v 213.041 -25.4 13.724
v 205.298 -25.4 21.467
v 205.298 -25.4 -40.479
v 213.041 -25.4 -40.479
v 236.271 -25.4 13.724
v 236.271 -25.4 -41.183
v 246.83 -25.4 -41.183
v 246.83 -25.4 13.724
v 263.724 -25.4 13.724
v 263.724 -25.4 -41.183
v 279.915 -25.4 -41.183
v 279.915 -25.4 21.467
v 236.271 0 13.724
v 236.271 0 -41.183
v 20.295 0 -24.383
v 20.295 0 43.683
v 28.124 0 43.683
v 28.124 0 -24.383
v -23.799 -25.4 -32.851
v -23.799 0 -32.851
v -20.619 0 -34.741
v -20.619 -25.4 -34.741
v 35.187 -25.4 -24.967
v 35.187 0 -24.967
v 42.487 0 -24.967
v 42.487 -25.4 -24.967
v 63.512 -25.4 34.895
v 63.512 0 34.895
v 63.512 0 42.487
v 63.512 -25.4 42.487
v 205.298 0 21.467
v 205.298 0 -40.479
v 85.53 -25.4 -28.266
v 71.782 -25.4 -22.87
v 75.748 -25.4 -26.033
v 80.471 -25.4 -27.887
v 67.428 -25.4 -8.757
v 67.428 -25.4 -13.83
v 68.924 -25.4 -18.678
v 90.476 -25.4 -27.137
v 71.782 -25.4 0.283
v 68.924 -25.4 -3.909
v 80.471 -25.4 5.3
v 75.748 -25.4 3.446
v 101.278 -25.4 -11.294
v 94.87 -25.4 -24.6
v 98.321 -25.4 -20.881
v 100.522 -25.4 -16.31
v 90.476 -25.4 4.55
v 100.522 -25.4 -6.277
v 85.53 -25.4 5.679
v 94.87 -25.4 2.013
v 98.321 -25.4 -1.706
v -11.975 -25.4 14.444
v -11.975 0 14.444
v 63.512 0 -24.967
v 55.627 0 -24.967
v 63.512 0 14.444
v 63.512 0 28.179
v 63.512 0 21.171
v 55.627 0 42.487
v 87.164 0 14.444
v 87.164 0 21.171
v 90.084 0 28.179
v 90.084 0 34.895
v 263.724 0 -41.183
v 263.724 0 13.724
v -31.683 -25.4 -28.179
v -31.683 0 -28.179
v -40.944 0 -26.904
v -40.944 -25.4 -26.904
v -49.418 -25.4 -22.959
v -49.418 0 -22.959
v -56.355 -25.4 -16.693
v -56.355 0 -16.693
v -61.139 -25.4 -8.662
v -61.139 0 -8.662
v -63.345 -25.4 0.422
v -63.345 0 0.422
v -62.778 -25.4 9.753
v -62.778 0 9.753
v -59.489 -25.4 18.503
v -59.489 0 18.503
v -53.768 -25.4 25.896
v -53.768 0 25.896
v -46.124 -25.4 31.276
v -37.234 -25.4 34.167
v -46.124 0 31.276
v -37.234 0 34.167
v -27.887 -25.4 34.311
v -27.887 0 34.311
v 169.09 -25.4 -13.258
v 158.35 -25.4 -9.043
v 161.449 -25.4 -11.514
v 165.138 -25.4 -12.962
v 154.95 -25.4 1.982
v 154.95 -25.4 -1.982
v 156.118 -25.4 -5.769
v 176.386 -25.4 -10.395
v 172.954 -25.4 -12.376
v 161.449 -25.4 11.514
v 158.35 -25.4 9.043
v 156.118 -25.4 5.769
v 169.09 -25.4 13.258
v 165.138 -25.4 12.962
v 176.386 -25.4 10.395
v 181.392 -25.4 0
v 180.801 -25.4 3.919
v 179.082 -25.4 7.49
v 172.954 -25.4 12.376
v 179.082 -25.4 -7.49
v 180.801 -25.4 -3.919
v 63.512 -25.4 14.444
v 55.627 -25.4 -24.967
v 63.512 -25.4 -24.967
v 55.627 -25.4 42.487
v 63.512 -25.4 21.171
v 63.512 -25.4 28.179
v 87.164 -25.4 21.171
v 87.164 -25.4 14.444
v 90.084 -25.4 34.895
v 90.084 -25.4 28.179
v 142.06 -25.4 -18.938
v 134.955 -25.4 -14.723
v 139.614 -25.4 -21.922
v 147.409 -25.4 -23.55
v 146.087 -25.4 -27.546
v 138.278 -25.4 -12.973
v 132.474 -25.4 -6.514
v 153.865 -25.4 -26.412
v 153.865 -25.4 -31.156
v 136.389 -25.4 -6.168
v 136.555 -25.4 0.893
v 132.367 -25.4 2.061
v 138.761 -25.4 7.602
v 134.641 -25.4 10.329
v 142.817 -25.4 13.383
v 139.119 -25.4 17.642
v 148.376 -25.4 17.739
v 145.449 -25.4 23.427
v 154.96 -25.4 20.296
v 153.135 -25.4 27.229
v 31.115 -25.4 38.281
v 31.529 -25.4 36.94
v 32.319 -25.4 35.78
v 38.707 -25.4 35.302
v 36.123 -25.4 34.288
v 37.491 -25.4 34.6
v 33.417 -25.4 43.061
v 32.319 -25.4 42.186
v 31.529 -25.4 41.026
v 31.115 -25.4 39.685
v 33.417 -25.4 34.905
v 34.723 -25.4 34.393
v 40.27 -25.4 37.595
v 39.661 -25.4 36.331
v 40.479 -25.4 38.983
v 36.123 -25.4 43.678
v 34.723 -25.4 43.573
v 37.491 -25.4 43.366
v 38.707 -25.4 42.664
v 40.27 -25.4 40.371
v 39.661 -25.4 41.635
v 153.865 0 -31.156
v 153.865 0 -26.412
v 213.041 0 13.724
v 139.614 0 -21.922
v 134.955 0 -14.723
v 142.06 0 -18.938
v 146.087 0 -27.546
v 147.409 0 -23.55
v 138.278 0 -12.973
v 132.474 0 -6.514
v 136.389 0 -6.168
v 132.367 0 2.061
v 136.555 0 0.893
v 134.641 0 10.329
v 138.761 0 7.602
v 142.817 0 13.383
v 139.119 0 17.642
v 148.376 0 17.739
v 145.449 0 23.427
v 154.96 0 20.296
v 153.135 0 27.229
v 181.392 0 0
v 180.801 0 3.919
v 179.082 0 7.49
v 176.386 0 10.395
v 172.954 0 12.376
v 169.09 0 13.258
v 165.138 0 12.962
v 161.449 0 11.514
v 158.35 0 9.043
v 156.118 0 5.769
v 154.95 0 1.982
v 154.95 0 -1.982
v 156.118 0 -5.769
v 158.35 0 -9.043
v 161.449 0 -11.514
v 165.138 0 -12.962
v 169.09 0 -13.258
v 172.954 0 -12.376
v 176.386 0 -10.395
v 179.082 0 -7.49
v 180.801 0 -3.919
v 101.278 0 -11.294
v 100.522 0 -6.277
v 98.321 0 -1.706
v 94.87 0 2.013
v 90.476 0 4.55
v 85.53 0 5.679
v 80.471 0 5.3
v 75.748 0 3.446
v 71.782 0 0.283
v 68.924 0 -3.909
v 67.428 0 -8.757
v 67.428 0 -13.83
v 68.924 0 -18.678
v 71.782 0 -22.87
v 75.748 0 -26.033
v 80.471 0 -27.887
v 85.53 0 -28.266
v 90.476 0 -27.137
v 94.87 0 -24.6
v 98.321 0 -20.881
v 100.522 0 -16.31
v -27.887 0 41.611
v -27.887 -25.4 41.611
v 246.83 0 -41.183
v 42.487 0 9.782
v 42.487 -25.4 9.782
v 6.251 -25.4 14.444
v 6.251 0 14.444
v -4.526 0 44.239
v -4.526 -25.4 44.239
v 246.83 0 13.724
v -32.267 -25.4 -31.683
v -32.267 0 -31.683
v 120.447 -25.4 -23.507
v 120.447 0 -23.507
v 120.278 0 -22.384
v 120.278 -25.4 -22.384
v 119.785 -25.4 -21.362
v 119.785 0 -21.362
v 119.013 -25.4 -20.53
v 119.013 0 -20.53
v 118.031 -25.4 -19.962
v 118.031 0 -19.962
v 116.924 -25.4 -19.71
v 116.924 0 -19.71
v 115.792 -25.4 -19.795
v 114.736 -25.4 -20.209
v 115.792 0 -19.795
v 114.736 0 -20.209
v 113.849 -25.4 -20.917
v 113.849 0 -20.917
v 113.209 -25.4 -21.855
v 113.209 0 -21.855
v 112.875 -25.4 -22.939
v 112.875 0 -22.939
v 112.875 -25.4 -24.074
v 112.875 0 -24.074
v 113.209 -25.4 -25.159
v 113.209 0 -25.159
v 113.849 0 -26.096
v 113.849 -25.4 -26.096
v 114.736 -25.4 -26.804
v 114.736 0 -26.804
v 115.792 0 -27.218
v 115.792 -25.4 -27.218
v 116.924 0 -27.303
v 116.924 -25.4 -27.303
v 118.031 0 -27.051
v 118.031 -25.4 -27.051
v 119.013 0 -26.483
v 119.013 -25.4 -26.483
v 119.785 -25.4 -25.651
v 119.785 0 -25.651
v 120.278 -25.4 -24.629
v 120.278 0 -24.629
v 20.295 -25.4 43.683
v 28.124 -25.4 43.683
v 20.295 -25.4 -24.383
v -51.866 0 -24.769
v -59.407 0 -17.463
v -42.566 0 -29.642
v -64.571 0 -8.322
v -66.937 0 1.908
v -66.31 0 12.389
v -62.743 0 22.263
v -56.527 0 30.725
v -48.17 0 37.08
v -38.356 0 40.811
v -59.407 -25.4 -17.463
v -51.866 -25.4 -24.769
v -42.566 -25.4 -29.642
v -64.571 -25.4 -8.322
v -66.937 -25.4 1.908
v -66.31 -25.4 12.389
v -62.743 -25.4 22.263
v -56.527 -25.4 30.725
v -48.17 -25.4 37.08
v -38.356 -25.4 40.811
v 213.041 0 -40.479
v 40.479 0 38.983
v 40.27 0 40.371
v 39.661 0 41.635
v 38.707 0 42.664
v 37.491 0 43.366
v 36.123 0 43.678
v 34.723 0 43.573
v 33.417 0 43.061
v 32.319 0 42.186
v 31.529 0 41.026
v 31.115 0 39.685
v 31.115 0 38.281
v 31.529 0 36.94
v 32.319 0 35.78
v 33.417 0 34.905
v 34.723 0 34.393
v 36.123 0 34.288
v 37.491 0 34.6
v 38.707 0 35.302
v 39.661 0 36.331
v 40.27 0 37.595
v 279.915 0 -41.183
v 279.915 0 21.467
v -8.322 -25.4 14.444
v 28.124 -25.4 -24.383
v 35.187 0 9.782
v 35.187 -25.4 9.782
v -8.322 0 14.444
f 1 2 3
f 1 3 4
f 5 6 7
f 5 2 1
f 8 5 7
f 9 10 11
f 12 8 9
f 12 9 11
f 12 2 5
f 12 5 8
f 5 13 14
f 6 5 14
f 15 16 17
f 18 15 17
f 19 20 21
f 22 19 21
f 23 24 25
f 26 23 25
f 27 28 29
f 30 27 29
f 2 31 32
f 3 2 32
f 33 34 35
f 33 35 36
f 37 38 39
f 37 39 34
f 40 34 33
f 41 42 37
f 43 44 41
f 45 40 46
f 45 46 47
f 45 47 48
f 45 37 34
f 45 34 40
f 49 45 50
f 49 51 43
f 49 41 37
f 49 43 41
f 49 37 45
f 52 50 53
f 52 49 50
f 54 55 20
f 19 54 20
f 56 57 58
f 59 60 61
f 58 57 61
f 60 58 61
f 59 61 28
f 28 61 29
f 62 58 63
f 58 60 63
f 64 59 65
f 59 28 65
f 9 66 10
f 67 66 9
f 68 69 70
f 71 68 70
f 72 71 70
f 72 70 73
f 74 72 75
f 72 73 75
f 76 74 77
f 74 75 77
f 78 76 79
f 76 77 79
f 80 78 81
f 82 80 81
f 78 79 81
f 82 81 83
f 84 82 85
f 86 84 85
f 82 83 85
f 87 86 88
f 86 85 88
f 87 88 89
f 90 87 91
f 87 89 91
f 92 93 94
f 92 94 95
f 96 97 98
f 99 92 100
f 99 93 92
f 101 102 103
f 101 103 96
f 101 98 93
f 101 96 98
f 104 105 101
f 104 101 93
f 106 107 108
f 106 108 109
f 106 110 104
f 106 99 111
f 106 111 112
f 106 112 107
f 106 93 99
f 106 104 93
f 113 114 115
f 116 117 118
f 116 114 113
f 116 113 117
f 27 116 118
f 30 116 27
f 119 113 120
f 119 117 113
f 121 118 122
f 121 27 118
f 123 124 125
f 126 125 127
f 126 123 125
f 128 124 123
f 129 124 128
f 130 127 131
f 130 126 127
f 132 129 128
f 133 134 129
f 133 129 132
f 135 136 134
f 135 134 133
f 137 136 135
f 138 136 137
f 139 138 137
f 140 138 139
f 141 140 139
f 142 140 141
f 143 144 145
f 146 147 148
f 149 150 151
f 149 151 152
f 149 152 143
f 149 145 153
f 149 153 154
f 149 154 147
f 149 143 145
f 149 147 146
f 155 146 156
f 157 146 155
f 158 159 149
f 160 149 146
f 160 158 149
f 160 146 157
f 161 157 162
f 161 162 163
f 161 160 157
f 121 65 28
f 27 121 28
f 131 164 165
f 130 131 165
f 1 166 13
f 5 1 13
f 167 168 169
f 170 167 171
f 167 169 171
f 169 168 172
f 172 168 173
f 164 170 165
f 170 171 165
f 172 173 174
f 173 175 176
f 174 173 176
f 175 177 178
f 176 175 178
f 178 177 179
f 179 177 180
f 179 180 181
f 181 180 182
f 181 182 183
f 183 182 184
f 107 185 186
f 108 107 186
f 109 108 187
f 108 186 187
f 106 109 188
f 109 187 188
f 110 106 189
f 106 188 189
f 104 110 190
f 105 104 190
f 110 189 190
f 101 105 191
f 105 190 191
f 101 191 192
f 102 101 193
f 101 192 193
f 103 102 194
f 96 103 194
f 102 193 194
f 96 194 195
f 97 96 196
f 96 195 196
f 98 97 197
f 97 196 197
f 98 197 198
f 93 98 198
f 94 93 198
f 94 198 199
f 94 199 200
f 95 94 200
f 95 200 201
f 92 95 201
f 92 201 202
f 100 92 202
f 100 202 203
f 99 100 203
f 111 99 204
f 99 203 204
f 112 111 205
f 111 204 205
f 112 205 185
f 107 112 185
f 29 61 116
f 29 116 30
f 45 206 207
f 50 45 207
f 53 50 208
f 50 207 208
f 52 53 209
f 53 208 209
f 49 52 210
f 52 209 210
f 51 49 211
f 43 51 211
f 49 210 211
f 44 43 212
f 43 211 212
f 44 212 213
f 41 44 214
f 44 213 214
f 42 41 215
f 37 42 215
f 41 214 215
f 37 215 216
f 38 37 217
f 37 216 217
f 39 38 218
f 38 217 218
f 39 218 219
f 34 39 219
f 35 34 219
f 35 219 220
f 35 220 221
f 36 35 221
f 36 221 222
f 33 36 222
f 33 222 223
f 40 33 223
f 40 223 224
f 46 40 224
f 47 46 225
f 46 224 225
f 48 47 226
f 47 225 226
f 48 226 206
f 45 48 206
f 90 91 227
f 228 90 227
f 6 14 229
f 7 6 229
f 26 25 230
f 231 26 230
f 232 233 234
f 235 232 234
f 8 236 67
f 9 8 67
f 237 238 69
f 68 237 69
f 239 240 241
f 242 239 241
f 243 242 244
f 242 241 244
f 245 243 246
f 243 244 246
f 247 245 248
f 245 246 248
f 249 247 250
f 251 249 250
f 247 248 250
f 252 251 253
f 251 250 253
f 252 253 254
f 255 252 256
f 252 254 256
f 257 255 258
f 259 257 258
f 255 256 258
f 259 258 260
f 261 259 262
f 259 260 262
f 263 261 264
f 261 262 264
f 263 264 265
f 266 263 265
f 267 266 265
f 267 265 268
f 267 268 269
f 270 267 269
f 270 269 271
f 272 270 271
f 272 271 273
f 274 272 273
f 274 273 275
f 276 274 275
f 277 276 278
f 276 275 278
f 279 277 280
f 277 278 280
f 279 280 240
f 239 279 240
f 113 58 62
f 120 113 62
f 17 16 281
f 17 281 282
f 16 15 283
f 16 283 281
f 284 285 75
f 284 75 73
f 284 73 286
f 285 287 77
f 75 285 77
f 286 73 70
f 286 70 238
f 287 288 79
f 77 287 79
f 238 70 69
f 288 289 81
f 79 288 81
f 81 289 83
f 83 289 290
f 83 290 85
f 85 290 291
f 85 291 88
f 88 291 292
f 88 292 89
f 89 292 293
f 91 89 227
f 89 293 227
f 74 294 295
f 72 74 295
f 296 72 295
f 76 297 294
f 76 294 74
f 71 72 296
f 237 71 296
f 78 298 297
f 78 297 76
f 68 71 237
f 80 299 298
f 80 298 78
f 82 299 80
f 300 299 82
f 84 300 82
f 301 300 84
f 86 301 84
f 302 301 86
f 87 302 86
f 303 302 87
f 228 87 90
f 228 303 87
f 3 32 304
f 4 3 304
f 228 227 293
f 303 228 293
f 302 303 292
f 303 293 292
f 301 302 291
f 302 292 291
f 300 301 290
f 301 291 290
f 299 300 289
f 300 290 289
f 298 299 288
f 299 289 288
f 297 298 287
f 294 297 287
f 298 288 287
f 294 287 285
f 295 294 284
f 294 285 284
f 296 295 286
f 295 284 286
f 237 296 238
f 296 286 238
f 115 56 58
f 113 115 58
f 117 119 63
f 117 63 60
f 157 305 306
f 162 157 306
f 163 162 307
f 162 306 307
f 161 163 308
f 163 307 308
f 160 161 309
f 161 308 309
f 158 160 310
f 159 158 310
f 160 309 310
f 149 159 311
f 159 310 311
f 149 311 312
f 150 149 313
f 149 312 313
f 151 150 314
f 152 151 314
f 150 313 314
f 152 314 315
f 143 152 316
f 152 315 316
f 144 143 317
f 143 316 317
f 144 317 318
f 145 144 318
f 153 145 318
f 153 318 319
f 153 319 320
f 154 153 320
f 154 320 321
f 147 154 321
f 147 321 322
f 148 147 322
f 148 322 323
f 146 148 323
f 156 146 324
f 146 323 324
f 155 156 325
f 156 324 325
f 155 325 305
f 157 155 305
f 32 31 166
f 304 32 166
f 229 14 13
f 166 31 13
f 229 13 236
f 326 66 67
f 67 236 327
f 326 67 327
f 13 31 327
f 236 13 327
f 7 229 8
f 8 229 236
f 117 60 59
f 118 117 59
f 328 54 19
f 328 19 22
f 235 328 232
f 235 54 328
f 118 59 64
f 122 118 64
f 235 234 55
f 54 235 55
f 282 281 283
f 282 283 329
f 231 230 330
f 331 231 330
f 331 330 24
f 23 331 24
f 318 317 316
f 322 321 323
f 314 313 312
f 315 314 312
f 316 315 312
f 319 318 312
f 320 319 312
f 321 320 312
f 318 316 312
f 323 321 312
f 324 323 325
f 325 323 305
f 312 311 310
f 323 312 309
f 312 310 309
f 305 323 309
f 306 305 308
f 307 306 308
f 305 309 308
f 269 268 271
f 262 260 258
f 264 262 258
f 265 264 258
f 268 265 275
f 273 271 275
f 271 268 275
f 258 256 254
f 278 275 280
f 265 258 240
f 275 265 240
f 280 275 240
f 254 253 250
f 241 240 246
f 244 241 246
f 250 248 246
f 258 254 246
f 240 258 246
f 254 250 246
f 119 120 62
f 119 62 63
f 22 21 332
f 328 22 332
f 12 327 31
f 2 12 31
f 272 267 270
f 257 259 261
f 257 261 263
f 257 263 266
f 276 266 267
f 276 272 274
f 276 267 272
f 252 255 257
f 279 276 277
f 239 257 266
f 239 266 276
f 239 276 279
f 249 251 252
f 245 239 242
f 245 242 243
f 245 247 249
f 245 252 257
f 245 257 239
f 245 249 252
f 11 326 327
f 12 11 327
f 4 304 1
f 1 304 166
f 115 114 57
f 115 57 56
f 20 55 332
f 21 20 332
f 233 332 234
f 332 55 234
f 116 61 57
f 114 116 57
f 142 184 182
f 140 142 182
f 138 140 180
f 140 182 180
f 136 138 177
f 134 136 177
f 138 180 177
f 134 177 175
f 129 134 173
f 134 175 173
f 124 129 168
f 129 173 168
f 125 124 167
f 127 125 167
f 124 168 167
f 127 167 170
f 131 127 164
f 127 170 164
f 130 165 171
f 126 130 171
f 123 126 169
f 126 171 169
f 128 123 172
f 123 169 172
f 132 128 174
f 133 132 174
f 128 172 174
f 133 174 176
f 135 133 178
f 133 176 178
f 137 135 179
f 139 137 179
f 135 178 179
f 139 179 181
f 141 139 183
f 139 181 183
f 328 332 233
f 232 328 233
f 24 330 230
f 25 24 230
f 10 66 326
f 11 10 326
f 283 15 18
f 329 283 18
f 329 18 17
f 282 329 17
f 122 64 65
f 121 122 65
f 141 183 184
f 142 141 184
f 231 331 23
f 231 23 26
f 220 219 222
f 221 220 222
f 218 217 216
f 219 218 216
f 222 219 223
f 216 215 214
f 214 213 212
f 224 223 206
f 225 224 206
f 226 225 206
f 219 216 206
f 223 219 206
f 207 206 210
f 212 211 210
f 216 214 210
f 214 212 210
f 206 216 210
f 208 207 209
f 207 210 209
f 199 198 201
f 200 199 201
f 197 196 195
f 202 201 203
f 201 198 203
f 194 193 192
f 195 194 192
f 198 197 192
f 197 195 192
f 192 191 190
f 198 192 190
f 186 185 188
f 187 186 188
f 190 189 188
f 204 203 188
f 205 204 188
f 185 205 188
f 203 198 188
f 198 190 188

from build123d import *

# Parameters (mm, degrees)
F1_DEPTH = 25.4
F0_W     = 7.8298877925
F0_H     = 68.0653508753
F0_R     = 4.7084777796
F0_W_2   = 7.884208113
F0_H_2   = 7.592190057
F0_H_3   = 6.7161675543
F0_H_4   = 7.0081744343
F0_H_5   = 6.7261058703
F0_R_2   = 17.0200115099
F2_R     = 3.8073110524
F3_DEPTH = 25.4
F2_R_2   = 13.2954407617
F2_W     = 23.2299566269
F2_H     = 7.7433204278
F2_W_2   = 16.1905884743
F2_H_2   = 54.9071850255


with BuildPart() as f1:
    # F0 (on Front) → F1 (new body)
    with BuildSketch(Plane.XZ):
        with BuildLine():
            Line((-27.8866961598, 34.3108586967), (-27.8866961598, 41.6110418737))
            ThreePointArc((-27.8866961598, 41.6110418737), (-67.0002469524, 7.1707083067), (-32.2668068111, -31.682793051))
            Line((-32.2668068111, -31.682793051), (-31.682793051, -28.1787049025))
            ThreePointArc((-31.682793051, -28.1787049025), (-63.4111898789, 5.1088059067), (-27.8866961598, 34.3108586967))
        make_face()
    extrude(amount=F1_DEPTH)


with BuildPart() as f1b:
    # F0 (on Front) → F1, piece 2 (new body)
    with BuildSketch(Plane.XZ):
        Polygon((6.2506846873, 14.4444245979), (-4.5261150226, 44.2391037941), (-11.9747848216, 14.4444245979), (-8.3222091198, 14.4444245979), (0, 14.4444245979), align=None)
        Polygon((-8.3222091198, 14.4444245979), (-11.9747848216, 14.4444245979), (-23.7985961139, -32.8508205712), (-20.6185314836, -34.7408648572), align=None)
    extrude(amount=F1_DEPTH)


with BuildPart() as f1c:
    # F0 (on Front) → F1, piece 3 (new body)
    with BuildSketch(Plane.XZ):
        with Locations((24.209449999, 9.6500674263)):
            Rectangle(F0_W, F0_H)
    extrude(amount=F1_DEPTH)


with BuildPart() as f1d:
    # F0 (on Front) → F1, piece 4 (new body)
    with BuildSketch(Plane.XZ):
        Polygon((42.4870625138, 9.7822444513), (35.1868793368, 9.7822444513), (35.1868793368, -24.3826080114), (35.1868793368, -24.9666236341), (42.4870625138, -24.9666236341), align=None)
    extrude(amount=F1_DEPTH)


with BuildPart() as f1e:
    # F0 (on Front) → F1, piece 5 (new body)
    with BuildSketch(Plane.XZ):
        with Locations((35.7708968222, 38.982976228)):
            Circle(F0_R)
    extrude(amount=F1_DEPTH)


with BuildPart() as f1f:
    # F0 (on Front) → F1, piece 6 (new body)
    with BuildSketch(Plane.XZ):
        with Locations((59.5694910735, 38.6909674853)):
            Rectangle(F0_W_2, F0_H_2)
        with Locations((59.5694910735, 31.5367886797)):
            Rectangle(F0_W_2, F0_H_3)
        with Locations((59.5694910735, 24.6746176854)):
            Rectangle(F0_W_2, F0_H_4)
        Polygon((75.775898993, 34.8948724568), (63.51159513, 34.8948724568), (63.51159513, 28.1787049025), (90.0842547417, 28.1787049025), (90.0842547417, 34.8948724568), align=None)
        with Locations((59.5694910735, 17.8074775331)):
            Rectangle(F0_W_2, F0_H_5)
        Polygon((63.51159513, 14.4444245979), (55.627387017, 14.4444245979), (55.627387017, -22.6305667311), (55.627387017, -24.9666236341), (63.51159513, -24.9666236341), align=None)
        Polygon((77.2359371185, 21.1705304682), (63.51159513, 21.1705304682), (63.51159513, 14.4444245979), (87.1641784906, 14.4444245979), (87.1641784906, 21.1705304682), align=None)
    extrude(amount=F1_DEPTH)


with BuildPart() as f1g:
    # F0 (on Front) → F1, piece 7 (new body)
    with BuildSketch(Plane.XZ):
        with Locations((84.2580720782, -11.2935425714)):
            Circle(F0_R_2)
    extrude(amount=F1_DEPTH)


with BuildPart() as f3:
    # F2 (on Front) → F3 (new body)
    with BuildSketch(Plane.XZ):
        with Locations((116.6396513581, -23.5065873712)):
            Circle(F2_R)
    extrude(amount=F3_DEPTH)


with BuildPart() as f3b:
    # F2 (on Front) → F3, piece 2 (new body)
    with BuildSketch(Plane.XZ):
        with BuildLine():
            Line((154.9598276615, 20.2961266041), (153.1352847815, 27.2293761373))
            ThreePointArc((153.1352847815, 27.2293761373), (132.1188694246, -2.2305181695), (153.8650989532, -31.1558805406))
            Line((153.8650989532, -31.1558805406), (153.8650989532, -26.4120791107))
            ThreePointArc((153.8650989532, -26.4120791107), (136.2118550036, -2.6313974946), (154.9598276615, 20.2961266041))
        make_face()
    extrude(amount=F3_DEPTH)


with BuildPart() as f3c:
    # F2 (on Front) → F3, piece 3 (new body)
    with BuildSketch(Plane.XZ):
        with Locations((168.0965125561, 0)):
            Circle(F2_R_2)
    extrude(amount=F3_DEPTH)


with BuildPart() as f3d:
    # F2 (on Front) → F3, piece 4 (new body)
    with BuildSketch(Plane.XZ):
        Polygon((213.0408883095, 21.4673504233), (205.2975445986, 21.4673504233), (205.2975445986, -40.4792129993), (213.0408883095, -40.4792129993), (213.0408883095, 13.7240299955), align=None)
        with Locations((224.6558666229, 17.5956902094)):
            Rectangle(F2_W, F2_H)
        Polygon((246.8299120665, 21.4673504233), (236.2708449364, 21.4673504233), (236.2708449364, 13.7240299955), (236.2708449364, -41.18315503), (246.8299120665, -41.18315503), (246.8299120665, 13.7240299955), align=None)
        Polygon((279.9150049686, 21.4673504233), (246.8299120665, 21.4673504233), (246.8299120665, 13.7240299955), (263.7244164944, 13.7240299955), (279.9150049686, 13.7240299955), align=None)
        with Locations((271.8197107315, -13.7295625173)):
            Rectangle(F2_W_2, F2_H_2)
    extrude(amount=F3_DEPTH)


solid = Compound([f1.part, f1b.part, f1c.part, f1d.part, f1e.part, f1f.part, f1g.part, f3.part, f3b.part, f3c.part, f3d.part])
